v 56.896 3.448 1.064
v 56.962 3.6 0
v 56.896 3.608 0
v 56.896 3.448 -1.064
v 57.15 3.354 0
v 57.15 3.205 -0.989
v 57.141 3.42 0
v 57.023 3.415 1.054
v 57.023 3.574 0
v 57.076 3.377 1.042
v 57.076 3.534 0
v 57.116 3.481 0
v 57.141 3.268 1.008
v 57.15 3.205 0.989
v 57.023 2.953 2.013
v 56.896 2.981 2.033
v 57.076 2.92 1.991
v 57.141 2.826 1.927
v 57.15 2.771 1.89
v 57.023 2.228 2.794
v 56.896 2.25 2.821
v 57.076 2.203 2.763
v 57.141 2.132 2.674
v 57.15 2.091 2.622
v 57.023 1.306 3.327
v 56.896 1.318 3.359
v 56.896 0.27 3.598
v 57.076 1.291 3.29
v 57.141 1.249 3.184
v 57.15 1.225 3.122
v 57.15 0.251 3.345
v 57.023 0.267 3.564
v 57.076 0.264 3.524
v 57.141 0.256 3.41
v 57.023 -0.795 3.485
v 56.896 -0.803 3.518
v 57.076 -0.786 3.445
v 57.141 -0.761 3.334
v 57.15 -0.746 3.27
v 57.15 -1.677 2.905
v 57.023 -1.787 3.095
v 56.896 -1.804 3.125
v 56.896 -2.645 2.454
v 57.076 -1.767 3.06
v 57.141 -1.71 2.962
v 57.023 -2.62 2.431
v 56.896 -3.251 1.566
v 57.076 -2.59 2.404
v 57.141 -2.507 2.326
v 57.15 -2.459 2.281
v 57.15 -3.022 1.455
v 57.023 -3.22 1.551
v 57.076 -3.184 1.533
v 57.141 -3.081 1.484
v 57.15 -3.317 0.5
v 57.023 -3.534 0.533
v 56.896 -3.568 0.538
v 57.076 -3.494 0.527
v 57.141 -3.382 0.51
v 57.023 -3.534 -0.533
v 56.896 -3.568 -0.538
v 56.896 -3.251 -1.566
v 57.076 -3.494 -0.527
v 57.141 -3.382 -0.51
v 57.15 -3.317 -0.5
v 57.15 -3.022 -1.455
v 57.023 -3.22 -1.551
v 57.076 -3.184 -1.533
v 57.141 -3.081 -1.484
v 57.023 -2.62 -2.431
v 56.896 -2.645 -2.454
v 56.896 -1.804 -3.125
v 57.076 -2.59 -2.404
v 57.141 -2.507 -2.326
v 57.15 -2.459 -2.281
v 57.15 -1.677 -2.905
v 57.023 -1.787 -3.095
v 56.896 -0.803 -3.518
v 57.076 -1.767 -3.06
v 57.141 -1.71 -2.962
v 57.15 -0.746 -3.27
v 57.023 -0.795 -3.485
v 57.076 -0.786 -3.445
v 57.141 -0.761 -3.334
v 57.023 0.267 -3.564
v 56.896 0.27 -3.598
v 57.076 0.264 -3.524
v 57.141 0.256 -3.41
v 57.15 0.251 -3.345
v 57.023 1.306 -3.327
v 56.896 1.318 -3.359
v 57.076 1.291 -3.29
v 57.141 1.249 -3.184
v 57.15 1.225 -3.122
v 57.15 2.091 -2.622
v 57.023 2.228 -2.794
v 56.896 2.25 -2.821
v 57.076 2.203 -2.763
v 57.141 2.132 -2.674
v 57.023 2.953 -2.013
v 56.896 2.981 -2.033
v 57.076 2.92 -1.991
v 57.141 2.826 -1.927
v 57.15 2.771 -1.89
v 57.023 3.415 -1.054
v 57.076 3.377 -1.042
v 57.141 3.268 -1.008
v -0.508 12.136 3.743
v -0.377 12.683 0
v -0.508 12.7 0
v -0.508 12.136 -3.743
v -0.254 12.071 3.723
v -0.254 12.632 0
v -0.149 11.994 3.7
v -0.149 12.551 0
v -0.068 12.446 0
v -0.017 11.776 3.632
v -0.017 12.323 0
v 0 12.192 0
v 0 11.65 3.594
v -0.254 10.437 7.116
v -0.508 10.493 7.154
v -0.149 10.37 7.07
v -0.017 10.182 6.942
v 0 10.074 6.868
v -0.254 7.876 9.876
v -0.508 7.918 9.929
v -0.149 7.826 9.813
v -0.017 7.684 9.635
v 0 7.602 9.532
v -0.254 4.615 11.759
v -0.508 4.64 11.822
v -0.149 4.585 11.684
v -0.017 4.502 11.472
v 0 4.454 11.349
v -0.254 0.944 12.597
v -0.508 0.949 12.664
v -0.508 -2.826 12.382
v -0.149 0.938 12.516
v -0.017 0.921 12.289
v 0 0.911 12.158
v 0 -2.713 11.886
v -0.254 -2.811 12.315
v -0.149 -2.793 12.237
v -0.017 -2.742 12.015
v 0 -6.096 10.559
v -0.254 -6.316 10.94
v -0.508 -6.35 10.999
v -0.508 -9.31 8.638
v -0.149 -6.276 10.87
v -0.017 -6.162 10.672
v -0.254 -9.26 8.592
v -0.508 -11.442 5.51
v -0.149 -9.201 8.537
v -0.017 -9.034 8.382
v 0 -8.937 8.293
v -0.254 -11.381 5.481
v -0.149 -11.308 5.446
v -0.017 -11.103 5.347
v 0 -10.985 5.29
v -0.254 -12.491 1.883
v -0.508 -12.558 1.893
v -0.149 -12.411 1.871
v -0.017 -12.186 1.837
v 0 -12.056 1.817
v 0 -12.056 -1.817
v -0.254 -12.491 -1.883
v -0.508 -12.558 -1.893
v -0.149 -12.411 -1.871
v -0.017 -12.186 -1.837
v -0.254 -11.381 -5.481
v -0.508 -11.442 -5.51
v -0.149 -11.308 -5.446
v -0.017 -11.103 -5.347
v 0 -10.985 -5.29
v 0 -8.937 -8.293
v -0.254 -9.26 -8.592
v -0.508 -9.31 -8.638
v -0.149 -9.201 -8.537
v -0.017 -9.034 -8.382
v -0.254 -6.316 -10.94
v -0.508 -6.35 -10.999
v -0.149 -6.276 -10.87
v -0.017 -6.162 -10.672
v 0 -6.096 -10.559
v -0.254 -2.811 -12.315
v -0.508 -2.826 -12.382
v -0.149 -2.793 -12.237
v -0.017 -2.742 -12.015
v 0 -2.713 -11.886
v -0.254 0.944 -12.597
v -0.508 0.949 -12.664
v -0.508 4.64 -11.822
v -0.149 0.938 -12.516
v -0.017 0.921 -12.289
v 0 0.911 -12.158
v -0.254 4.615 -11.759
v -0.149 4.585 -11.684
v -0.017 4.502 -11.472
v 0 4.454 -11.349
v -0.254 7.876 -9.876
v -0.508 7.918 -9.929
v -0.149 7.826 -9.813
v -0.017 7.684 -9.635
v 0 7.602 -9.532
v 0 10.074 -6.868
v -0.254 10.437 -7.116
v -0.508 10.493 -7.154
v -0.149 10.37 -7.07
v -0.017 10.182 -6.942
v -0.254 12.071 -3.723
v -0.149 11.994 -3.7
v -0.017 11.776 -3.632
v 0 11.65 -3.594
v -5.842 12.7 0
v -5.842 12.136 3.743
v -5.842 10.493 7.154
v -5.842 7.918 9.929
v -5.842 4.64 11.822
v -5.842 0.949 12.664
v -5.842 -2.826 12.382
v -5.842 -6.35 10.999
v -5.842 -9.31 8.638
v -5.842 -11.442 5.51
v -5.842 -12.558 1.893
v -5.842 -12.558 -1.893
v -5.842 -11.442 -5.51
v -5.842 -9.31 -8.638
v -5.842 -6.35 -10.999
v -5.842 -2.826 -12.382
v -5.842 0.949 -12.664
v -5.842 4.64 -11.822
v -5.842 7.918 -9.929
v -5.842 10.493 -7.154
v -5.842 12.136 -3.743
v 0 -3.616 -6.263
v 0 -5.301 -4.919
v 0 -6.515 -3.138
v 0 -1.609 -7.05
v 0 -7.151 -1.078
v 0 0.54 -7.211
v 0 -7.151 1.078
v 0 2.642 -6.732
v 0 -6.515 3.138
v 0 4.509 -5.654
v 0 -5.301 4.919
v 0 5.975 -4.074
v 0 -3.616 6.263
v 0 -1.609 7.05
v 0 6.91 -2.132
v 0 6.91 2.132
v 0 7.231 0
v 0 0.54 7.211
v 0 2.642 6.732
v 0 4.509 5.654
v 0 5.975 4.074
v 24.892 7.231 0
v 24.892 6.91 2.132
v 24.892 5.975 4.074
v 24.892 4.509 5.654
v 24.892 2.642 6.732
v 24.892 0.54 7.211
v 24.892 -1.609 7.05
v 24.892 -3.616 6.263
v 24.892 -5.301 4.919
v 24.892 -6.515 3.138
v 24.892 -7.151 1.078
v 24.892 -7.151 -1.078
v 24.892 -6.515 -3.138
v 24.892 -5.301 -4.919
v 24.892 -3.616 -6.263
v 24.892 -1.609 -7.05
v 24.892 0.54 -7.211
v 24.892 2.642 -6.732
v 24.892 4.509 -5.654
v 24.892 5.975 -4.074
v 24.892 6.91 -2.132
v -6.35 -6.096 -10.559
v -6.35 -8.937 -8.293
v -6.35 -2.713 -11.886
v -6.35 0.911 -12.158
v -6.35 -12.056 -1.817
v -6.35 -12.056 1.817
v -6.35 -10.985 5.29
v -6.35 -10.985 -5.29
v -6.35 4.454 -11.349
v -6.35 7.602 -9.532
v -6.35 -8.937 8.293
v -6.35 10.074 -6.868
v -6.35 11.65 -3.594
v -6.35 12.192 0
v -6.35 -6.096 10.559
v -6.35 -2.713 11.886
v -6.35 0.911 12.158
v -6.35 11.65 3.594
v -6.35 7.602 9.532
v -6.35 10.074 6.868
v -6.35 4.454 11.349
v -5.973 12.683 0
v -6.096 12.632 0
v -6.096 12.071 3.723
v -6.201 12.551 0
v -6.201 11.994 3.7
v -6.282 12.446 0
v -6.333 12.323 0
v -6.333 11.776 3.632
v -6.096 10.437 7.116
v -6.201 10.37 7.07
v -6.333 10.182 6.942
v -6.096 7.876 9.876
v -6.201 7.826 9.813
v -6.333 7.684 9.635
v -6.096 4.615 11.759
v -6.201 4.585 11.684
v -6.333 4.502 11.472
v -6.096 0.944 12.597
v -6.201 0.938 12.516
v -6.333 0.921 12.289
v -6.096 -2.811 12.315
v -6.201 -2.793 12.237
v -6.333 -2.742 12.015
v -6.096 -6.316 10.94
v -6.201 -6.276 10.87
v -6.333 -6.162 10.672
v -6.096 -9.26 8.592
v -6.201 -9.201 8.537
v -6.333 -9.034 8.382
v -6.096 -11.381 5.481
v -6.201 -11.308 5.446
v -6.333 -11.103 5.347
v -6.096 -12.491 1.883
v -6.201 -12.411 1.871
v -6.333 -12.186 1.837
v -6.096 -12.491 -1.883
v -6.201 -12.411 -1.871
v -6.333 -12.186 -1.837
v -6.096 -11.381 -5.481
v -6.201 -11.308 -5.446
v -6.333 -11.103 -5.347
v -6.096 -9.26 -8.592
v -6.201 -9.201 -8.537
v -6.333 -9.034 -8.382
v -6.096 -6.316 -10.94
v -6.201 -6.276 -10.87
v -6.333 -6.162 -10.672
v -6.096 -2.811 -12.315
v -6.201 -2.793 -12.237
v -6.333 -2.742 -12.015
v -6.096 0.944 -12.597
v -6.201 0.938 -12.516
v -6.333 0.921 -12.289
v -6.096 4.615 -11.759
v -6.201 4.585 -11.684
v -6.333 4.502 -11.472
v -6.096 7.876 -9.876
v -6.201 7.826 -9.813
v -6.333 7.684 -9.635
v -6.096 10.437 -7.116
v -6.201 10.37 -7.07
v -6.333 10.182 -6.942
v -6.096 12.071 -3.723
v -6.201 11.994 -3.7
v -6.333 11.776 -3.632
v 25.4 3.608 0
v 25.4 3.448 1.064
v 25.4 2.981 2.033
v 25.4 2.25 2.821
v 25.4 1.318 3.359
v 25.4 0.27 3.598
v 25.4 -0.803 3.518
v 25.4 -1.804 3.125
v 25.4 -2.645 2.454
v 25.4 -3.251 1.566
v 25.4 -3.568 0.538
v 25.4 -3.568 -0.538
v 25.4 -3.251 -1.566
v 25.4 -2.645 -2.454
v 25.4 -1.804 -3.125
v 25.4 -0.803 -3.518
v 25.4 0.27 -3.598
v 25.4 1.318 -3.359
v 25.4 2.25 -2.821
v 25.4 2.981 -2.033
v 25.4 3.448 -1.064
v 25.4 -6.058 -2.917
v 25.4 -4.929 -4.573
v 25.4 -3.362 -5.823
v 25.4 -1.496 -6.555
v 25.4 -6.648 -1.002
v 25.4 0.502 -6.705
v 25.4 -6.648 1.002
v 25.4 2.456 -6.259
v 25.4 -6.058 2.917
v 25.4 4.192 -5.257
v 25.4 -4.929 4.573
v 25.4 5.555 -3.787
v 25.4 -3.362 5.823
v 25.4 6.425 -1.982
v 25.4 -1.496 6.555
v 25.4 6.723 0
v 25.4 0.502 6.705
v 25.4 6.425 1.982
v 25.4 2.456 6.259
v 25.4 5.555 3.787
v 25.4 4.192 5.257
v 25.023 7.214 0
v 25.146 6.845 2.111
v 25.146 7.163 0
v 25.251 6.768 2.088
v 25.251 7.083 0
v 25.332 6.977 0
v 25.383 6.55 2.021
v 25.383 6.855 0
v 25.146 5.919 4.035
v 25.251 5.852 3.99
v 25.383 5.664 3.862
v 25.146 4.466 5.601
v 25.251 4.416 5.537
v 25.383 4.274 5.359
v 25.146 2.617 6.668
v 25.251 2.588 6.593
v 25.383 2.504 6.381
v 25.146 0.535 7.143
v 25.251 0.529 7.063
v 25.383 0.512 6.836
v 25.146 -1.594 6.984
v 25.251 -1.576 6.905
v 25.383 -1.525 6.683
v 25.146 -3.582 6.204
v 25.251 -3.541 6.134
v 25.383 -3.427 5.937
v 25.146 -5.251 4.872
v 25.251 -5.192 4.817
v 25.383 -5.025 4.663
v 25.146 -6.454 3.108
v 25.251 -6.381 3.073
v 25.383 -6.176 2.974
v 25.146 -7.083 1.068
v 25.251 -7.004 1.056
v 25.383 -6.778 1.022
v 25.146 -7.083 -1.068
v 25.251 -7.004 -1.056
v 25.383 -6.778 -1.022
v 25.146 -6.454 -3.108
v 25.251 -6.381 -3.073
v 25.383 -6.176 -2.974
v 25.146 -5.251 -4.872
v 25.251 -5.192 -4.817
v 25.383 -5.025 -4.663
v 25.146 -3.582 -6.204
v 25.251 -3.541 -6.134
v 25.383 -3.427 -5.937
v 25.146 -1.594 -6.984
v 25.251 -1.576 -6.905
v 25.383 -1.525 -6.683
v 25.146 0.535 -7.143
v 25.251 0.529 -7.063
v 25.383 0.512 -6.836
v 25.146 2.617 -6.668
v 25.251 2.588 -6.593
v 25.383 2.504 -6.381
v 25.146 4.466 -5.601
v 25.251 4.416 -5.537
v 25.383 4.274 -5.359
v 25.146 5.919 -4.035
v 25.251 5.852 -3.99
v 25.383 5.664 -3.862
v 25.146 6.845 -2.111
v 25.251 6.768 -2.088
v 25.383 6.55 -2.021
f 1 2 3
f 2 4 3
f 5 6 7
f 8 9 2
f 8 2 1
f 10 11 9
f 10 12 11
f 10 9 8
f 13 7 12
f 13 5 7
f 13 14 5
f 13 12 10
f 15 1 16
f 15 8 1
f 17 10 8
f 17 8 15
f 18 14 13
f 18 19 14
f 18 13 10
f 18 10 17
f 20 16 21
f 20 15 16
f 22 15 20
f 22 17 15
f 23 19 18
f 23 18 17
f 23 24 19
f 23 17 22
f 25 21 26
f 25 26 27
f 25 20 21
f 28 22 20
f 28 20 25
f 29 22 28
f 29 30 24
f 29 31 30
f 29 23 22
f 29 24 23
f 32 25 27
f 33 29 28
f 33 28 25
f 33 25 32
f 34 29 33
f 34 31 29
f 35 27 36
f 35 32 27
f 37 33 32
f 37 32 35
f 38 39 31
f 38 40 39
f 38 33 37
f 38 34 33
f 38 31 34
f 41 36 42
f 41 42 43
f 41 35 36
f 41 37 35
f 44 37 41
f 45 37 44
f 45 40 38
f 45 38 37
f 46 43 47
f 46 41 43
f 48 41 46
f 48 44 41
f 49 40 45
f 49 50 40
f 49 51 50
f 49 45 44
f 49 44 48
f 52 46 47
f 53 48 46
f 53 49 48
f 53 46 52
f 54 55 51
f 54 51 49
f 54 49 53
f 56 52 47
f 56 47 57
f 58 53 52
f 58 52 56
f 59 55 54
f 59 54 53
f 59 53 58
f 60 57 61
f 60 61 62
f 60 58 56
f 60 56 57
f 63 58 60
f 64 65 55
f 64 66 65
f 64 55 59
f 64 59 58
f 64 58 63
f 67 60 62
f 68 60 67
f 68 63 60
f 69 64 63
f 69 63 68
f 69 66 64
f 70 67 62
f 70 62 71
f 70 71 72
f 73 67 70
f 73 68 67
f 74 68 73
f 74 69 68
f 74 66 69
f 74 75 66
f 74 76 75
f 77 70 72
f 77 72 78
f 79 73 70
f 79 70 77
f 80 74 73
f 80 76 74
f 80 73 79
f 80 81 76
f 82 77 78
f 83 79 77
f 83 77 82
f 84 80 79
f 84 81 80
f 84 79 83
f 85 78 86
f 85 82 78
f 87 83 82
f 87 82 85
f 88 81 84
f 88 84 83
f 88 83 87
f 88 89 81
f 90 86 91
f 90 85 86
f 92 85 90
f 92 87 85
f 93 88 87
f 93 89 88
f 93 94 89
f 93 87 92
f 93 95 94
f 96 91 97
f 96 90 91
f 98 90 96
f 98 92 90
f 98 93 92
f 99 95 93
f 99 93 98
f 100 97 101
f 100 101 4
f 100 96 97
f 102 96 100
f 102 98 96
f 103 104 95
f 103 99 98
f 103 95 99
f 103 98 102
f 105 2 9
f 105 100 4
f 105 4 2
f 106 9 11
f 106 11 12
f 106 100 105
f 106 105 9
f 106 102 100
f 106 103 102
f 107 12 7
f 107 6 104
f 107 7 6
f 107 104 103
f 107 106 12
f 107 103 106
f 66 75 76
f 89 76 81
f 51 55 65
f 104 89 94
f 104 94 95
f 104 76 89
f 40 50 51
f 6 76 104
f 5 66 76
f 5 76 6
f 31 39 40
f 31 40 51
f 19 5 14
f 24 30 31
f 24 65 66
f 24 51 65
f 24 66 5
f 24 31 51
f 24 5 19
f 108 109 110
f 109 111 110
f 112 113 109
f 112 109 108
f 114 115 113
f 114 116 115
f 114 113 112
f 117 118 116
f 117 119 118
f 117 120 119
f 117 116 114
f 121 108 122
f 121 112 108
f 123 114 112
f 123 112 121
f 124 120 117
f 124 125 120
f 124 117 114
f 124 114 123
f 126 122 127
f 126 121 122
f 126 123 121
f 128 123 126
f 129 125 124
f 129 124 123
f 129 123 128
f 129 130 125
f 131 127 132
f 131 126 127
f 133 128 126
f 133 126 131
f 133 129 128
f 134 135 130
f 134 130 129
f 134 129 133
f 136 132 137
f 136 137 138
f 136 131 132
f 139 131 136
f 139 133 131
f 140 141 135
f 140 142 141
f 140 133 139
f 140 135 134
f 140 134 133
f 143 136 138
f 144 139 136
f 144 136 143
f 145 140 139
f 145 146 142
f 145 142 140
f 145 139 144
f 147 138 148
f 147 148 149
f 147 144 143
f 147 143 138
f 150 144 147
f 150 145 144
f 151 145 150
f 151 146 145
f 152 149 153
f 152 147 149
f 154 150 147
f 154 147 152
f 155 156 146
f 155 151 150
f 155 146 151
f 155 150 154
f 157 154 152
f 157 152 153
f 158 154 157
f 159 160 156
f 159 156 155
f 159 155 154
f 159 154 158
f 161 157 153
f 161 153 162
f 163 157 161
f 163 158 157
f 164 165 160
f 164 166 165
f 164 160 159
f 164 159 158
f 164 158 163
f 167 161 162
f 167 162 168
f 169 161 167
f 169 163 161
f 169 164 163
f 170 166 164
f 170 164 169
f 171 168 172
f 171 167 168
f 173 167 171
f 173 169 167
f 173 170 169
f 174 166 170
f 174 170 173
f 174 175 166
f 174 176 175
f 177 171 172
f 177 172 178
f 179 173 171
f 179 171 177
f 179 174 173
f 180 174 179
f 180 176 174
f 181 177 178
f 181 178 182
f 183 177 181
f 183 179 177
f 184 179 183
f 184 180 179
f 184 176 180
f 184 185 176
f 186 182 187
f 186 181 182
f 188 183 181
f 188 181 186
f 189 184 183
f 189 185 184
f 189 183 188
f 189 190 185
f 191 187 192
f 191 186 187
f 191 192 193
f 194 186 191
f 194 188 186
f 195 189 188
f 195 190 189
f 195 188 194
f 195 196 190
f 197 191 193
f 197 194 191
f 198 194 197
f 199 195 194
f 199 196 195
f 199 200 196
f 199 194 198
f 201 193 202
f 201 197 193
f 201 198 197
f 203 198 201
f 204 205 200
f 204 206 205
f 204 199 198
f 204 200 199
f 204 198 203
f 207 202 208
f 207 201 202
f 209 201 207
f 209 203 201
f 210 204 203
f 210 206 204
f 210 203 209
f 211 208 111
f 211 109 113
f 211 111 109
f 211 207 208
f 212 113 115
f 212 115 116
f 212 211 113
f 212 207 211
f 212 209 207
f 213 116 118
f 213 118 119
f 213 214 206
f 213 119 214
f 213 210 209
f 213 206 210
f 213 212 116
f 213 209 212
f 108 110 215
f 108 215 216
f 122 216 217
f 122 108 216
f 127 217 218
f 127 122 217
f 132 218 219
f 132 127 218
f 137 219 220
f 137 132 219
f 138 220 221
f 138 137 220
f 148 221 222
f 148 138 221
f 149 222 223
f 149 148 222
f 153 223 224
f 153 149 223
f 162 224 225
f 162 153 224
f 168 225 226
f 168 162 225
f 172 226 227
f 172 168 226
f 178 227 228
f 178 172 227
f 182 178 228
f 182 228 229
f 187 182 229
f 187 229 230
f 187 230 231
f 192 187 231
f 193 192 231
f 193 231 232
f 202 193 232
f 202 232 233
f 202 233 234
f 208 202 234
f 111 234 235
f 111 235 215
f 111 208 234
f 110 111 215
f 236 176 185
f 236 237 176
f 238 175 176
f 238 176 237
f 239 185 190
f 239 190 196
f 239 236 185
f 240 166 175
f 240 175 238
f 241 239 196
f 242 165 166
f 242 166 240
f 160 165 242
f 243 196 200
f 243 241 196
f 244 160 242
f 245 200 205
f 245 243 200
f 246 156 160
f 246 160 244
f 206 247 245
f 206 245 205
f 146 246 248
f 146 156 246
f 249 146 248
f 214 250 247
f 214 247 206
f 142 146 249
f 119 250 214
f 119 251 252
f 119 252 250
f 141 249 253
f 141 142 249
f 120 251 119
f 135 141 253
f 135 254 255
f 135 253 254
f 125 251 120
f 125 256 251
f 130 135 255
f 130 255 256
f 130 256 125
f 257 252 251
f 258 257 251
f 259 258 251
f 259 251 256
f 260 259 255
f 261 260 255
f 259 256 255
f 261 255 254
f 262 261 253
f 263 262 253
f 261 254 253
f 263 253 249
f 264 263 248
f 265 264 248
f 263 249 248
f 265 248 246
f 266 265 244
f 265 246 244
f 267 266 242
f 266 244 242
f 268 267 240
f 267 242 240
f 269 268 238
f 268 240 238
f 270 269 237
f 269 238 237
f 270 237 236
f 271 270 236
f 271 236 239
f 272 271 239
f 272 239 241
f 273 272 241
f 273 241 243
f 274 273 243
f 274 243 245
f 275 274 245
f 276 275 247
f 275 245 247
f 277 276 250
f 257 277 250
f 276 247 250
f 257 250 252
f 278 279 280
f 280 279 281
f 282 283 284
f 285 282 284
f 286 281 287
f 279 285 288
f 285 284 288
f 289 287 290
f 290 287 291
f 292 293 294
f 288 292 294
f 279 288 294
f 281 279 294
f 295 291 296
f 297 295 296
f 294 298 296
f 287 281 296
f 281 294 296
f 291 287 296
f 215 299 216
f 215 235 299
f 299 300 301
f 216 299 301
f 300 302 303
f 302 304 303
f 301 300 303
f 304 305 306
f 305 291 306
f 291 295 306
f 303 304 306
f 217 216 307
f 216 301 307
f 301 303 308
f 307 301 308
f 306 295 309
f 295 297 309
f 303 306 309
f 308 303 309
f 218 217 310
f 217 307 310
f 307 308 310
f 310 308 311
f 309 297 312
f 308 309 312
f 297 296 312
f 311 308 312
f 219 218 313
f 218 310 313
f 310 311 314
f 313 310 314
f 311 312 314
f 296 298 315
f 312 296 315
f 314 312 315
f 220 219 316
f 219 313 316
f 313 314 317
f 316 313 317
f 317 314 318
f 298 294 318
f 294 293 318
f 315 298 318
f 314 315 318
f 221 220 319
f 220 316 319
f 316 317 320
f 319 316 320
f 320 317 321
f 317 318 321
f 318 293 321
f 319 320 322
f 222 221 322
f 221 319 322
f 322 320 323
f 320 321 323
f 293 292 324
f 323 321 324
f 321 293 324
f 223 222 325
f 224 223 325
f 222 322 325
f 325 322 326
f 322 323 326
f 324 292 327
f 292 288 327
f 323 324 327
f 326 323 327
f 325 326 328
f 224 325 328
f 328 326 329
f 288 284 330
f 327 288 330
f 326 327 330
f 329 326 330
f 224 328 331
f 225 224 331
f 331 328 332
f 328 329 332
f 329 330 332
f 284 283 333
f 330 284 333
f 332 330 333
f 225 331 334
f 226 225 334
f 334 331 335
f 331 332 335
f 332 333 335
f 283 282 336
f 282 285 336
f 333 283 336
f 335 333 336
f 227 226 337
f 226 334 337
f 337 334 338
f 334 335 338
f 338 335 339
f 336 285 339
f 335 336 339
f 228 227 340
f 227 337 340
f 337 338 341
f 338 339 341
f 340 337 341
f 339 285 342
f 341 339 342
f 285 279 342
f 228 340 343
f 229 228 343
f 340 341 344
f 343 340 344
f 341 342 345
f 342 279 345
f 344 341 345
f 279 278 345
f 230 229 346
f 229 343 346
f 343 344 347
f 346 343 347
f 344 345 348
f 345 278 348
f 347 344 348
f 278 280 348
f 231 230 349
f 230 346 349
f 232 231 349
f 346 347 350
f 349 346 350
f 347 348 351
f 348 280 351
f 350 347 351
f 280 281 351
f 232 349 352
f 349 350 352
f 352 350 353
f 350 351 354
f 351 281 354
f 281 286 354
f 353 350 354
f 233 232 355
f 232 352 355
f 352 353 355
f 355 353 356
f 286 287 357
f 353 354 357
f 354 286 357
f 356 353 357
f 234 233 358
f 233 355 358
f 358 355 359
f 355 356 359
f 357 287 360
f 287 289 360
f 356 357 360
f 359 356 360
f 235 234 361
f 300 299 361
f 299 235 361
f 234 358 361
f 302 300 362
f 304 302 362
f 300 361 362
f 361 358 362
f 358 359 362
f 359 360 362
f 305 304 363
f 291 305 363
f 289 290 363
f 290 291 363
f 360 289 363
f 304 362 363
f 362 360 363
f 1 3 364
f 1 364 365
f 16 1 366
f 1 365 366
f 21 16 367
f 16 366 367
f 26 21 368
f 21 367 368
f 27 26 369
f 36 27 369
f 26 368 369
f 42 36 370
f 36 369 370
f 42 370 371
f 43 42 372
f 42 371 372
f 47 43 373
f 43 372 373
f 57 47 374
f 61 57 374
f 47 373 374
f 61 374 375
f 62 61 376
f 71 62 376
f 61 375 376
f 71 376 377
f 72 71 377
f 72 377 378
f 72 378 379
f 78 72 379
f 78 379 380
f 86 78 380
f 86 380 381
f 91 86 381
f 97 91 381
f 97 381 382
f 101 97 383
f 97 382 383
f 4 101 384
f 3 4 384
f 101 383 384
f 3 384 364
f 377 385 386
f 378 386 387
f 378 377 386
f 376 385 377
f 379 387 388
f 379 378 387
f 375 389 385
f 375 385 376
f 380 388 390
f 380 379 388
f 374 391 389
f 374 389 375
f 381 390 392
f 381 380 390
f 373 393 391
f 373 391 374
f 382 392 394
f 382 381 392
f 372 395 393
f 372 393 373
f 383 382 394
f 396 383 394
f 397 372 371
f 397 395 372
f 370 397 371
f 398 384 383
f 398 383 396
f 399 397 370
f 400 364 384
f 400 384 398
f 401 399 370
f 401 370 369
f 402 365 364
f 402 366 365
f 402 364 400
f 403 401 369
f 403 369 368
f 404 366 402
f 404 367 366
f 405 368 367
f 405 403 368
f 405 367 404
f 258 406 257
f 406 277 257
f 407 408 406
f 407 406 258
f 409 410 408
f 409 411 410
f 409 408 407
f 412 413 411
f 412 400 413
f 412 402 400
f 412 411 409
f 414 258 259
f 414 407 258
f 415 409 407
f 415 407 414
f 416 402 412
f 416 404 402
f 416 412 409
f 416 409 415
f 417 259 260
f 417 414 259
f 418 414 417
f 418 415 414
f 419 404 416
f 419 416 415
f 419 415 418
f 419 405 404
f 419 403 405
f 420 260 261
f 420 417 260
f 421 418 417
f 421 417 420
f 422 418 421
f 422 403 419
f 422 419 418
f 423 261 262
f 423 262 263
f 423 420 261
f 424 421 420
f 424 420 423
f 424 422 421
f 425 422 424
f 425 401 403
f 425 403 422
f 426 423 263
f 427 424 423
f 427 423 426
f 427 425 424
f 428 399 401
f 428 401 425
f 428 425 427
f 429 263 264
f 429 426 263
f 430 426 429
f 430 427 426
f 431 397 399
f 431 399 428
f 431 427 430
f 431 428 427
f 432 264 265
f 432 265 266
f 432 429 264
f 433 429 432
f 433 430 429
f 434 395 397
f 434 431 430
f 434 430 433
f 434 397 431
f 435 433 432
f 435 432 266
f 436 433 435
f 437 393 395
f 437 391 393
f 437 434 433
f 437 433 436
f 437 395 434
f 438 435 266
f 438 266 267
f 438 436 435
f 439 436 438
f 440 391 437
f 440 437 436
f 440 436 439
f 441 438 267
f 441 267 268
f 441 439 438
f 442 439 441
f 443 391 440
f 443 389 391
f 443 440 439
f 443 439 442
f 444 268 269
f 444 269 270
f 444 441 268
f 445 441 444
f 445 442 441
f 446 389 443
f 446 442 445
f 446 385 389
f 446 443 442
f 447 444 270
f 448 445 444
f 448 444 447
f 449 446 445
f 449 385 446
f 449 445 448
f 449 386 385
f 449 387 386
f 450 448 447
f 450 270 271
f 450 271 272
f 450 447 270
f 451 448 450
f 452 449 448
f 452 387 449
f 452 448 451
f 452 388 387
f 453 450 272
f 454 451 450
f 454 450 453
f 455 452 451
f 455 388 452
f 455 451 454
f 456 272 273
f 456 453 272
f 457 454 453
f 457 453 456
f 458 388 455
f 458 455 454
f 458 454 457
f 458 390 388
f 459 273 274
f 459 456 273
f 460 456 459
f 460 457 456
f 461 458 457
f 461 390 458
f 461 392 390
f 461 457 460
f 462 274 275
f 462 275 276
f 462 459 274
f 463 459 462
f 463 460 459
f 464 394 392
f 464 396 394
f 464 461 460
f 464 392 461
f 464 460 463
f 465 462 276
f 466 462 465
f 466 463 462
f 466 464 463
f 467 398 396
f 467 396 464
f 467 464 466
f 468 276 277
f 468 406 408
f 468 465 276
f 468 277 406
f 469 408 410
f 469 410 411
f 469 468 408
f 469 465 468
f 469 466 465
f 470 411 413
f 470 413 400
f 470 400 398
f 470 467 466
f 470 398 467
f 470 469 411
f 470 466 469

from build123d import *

# Parameters (mm, degrees)
F0_R     = 12.7
F1_DEPTH = 6.35
F2_R     = 7.231453
F3_DEPTH = 25.4
F4_R     = 3.608235
F5_DEPTH = 31.75
F6_R     = 0.508
F7_R     = 0.508
F8_R     = 0.508
F9_R     = 0.254


with BuildPart() as f1:
    # F0 (on Right) → F1 (new body)
    with BuildSketch(Plane.YZ):
        Circle(F0_R)
    extrude(amount=-F1_DEPTH)

    # F2 (on Right) → F3 (join)
    with BuildSketch(Plane.YZ):
        Circle(F2_R)
    extrude(amount=F3_DEPTH)

    # F4 (on face) → F5 (join)
    with BuildSketch(Plane.YZ.offset(25.4)):
        Circle(F4_R)
    extrude(amount=F5_DEPTH)

    # F6
    f6_edges = [f1.edges().sort_by_distance(p)[0] for p in [
        (-6.35, -12.7, 0),
    ]]
    fillet(f6_edges, radius=F6_R)

    # F7
    f7_edges = [f1.edges().sort_by_distance(p)[0] for p in [
        (0, -12.7, 0),
    ]]
    fillet(f7_edges, radius=F7_R)

    # F8
    f8_edges = [f1.edges().sort_by_distance(p)[0] for p in [
        (25.4, -7.231453, 0),
    ]]
    fillet(f8_edges, radius=F8_R)

    # F9
    f9_edges = [f1.edges().sort_by_distance(p)[0] for p in [
        (57.15, -3.608235, 0),
    ]]
    fillet(f9_edges, radius=F9_R)


solid = f1.part
